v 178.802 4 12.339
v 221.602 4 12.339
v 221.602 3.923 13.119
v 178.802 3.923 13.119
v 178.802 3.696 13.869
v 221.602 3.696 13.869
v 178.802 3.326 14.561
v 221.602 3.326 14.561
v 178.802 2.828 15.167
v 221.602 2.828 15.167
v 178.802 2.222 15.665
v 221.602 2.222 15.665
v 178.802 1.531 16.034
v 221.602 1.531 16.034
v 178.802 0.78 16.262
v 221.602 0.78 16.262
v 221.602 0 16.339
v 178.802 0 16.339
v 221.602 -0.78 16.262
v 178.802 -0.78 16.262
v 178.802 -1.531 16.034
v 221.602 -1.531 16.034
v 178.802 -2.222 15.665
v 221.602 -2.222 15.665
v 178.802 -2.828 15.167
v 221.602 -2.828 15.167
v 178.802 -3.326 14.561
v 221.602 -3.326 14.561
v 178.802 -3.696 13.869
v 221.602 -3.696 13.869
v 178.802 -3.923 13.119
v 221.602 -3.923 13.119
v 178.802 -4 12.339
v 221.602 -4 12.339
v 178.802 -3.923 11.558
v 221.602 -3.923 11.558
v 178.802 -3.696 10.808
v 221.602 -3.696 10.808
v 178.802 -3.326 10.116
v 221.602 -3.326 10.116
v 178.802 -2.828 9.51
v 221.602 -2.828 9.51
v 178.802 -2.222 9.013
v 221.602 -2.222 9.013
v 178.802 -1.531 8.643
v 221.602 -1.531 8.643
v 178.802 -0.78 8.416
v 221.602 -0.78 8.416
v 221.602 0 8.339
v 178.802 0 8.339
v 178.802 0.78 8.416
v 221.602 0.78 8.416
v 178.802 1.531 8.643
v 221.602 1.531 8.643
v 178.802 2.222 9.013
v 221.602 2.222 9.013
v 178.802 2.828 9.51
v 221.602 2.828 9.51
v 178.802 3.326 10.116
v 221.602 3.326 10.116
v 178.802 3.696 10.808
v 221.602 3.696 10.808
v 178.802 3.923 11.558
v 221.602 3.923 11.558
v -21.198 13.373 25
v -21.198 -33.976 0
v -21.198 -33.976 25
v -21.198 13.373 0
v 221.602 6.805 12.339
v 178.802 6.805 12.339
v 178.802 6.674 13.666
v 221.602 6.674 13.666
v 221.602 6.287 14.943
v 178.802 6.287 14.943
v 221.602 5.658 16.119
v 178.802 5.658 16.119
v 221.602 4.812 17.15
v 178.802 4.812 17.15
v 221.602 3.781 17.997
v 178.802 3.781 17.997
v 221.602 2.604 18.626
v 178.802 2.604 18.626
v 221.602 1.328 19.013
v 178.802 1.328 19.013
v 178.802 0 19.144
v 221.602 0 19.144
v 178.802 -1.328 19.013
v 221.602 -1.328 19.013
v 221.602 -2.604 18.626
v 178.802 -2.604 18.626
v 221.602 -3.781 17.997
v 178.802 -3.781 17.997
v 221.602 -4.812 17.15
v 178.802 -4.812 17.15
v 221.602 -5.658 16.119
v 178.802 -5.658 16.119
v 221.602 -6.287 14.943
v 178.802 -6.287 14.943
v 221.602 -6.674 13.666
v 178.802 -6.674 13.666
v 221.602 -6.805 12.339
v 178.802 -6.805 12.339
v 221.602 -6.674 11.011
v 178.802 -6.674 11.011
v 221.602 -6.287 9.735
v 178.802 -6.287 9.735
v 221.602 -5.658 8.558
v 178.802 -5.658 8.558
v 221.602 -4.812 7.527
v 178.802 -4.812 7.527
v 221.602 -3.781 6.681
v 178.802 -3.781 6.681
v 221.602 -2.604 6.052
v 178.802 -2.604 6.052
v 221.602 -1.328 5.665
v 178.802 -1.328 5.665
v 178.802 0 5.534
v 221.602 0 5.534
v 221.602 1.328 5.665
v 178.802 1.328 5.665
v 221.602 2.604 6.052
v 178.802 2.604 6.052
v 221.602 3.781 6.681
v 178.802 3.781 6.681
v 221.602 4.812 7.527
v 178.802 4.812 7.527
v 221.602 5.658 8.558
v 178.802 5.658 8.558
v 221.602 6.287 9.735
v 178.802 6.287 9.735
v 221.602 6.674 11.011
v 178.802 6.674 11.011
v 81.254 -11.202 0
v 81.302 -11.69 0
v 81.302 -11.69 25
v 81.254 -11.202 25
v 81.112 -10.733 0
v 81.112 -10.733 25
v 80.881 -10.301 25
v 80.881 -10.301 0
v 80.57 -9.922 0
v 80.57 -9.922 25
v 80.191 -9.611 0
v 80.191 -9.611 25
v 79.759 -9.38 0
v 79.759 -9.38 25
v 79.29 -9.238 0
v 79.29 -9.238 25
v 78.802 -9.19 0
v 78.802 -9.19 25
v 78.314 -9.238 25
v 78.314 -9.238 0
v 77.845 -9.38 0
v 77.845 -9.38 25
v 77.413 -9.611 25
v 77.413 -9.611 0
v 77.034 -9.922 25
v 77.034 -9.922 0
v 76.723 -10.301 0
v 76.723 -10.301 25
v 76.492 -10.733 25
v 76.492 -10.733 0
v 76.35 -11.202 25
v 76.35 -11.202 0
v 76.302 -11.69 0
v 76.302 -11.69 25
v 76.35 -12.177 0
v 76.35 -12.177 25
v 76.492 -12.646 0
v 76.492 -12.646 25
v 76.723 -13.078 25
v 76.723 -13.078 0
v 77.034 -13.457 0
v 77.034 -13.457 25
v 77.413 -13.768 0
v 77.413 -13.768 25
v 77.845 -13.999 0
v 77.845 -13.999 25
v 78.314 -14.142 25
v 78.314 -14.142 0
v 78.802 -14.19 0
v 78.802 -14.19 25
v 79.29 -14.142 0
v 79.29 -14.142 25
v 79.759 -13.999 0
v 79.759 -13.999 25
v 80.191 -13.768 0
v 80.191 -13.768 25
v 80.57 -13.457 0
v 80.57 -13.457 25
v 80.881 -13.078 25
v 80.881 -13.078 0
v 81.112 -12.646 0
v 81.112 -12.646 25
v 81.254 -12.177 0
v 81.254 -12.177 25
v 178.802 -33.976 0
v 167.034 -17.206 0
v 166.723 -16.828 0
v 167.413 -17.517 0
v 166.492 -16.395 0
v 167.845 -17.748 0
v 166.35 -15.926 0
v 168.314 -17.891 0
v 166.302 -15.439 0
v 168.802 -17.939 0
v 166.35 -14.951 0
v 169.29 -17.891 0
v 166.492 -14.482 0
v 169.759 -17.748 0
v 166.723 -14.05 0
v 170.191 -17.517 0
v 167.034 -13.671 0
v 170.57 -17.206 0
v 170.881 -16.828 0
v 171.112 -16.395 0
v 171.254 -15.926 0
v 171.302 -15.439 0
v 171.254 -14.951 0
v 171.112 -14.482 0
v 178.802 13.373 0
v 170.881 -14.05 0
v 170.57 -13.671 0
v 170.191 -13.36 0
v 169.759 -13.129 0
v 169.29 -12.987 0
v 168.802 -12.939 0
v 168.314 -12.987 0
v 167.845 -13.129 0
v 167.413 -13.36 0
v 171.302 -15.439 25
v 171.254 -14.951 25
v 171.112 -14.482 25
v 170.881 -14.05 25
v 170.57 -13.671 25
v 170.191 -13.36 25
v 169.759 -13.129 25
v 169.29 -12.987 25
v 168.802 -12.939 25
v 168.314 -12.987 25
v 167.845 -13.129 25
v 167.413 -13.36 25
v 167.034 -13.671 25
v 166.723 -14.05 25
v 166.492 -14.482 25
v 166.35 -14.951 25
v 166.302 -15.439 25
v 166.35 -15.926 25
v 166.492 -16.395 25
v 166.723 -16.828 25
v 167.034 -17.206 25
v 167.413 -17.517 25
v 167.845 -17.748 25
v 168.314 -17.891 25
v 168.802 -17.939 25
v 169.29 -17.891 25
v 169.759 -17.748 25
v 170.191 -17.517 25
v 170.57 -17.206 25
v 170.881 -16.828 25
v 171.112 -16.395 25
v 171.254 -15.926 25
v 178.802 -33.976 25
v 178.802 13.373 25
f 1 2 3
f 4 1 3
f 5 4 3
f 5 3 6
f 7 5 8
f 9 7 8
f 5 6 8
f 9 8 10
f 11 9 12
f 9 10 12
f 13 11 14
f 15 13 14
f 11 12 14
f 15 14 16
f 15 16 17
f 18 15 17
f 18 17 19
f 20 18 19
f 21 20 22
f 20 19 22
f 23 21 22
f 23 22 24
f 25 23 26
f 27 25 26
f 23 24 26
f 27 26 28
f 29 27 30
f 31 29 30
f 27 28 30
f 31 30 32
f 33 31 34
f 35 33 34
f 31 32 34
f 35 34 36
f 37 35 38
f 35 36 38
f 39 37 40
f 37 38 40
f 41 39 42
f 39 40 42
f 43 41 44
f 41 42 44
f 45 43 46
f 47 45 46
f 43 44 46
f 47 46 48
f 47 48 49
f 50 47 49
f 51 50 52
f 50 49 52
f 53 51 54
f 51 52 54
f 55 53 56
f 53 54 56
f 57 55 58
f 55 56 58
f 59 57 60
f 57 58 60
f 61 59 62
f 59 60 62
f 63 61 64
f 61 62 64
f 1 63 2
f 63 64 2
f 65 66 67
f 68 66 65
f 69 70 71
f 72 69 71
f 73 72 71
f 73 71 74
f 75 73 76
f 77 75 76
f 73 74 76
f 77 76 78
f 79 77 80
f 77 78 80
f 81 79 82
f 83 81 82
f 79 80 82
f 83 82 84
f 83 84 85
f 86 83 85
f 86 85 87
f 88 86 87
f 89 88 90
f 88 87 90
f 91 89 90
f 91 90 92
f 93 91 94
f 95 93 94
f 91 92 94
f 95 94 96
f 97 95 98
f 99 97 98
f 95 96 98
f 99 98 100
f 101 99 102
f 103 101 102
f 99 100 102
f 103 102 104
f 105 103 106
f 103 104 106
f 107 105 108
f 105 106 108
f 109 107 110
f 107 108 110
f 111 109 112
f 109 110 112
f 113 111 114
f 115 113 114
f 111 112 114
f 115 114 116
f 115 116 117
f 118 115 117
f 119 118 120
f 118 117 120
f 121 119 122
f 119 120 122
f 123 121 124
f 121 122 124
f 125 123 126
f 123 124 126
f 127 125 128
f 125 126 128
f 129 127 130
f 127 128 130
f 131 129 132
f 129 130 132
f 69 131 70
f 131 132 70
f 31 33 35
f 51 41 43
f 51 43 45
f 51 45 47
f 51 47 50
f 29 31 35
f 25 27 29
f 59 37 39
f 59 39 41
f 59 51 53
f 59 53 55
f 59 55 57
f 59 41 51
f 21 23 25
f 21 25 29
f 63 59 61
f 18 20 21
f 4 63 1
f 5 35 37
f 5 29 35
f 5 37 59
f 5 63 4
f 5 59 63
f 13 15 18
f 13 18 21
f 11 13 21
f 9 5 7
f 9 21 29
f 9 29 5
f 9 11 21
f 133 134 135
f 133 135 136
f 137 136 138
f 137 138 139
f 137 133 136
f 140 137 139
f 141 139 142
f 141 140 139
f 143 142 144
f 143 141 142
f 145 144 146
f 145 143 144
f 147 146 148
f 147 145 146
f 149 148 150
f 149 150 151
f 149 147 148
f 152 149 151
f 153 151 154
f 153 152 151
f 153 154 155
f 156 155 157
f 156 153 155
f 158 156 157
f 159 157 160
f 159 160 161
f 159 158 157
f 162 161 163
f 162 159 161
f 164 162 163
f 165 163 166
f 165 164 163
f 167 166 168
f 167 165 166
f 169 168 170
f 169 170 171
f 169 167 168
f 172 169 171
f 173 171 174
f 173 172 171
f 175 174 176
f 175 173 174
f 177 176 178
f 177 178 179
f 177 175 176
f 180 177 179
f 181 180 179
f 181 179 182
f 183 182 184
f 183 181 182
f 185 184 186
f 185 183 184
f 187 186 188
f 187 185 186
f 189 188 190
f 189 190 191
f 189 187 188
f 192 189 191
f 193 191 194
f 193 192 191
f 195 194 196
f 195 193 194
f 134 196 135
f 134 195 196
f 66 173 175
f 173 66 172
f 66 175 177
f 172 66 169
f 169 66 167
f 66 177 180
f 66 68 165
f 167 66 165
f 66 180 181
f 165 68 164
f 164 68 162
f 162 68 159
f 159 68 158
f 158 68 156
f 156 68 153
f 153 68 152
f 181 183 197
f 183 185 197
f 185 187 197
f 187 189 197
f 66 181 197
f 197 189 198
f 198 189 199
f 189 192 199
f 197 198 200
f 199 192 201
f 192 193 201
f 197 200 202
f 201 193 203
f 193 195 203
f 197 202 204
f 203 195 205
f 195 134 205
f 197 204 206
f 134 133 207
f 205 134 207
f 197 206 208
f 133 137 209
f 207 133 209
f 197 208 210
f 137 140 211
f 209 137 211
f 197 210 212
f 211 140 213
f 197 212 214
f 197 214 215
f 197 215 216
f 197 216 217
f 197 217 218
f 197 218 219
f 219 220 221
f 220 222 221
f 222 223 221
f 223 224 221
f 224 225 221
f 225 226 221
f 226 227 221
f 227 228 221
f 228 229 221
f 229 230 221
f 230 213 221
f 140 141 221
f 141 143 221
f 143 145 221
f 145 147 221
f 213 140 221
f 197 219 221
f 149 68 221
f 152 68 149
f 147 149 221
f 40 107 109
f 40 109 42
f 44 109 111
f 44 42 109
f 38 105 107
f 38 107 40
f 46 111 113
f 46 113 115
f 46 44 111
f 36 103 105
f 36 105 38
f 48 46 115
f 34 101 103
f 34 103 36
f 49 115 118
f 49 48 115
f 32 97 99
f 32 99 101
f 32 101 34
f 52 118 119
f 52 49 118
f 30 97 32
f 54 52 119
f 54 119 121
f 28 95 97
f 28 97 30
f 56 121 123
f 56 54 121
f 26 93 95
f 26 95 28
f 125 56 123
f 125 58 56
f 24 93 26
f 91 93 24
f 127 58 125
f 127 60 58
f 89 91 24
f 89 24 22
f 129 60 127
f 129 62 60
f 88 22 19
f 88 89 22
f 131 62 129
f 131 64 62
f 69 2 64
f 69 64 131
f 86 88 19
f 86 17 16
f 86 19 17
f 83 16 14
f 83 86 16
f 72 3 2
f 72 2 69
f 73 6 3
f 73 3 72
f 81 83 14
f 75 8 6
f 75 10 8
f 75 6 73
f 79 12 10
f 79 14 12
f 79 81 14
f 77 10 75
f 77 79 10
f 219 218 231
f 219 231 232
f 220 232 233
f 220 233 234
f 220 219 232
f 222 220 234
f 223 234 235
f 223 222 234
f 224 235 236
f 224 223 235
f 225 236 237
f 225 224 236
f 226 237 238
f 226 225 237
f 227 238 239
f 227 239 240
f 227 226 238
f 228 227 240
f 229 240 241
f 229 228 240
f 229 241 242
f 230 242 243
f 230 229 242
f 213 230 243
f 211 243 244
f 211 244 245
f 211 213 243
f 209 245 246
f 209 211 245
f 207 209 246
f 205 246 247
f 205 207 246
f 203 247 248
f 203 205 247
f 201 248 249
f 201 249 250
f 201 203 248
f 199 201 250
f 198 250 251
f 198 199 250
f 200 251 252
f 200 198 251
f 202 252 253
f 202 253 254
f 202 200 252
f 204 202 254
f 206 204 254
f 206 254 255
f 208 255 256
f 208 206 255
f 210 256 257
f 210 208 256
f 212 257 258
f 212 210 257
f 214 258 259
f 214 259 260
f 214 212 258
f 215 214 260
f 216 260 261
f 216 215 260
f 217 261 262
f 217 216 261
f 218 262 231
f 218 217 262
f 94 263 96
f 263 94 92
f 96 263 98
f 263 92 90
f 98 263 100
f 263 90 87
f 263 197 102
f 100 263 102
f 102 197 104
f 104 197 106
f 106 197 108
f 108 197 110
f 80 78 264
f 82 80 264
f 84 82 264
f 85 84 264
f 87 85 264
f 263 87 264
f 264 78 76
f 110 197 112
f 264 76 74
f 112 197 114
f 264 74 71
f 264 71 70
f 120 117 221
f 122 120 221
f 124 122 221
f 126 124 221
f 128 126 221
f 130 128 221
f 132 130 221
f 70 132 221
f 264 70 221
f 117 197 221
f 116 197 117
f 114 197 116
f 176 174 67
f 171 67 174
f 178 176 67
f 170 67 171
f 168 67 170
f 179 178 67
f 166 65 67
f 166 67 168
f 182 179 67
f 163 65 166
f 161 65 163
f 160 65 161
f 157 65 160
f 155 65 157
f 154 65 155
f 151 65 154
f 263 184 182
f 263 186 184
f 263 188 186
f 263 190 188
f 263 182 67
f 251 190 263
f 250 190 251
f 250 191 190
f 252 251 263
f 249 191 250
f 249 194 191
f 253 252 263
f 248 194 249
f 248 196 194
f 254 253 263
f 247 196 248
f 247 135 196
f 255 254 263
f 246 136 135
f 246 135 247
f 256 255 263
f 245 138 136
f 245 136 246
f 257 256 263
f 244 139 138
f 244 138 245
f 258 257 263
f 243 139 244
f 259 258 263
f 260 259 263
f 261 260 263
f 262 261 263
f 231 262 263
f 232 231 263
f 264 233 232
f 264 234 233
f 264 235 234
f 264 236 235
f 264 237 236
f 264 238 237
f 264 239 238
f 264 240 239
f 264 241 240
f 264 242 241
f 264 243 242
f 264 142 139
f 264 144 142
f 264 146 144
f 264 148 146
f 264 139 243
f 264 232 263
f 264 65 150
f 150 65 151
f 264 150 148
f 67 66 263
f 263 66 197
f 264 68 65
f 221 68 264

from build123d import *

# Parameters (mm, degrees)
F0_W     = 200
F0_H     = 47.349059
F0_R     = 2.5
F1_DEPTH = 25
F2_R     = 6.804823
F3_DEPTH = 42.8
F4_R     = 4
F5_DEPTH = 42.8


with BuildPart() as f1:
    # F0 (on Top) → F1 (new body)
    with BuildSketch(Plane.XY):
        with Locations((78.801886, -10.301887)):
            Rectangle(F0_W, F0_H)
        with Locations((78.801886, -11.689553)):
            Circle(F0_R, mode=Mode.SUBTRACT)
        with Locations((168.801886, -15.438692)):
            Circle(F0_R, mode=Mode.SUBTRACT)
    extrude(amount=F1_DEPTH)

    # F2 (on face) → F3 (join)
    with BuildSketch(Plane.YZ.offset(178.801886)):
        with Locations((0, 12.338707)):
            Circle(F2_R)
    extrude(amount=F3_DEPTH)

    # F4 (on face) → F5 (cut, through all)
    with BuildSketch(Plane.YZ.offset(221.601886)):
        with Locations((0, 12.338707)):
            Circle(F4_R)
    extrude(amount=-F5_DEPTH, mode=Mode.SUBTRACT)


solid = f1.part
